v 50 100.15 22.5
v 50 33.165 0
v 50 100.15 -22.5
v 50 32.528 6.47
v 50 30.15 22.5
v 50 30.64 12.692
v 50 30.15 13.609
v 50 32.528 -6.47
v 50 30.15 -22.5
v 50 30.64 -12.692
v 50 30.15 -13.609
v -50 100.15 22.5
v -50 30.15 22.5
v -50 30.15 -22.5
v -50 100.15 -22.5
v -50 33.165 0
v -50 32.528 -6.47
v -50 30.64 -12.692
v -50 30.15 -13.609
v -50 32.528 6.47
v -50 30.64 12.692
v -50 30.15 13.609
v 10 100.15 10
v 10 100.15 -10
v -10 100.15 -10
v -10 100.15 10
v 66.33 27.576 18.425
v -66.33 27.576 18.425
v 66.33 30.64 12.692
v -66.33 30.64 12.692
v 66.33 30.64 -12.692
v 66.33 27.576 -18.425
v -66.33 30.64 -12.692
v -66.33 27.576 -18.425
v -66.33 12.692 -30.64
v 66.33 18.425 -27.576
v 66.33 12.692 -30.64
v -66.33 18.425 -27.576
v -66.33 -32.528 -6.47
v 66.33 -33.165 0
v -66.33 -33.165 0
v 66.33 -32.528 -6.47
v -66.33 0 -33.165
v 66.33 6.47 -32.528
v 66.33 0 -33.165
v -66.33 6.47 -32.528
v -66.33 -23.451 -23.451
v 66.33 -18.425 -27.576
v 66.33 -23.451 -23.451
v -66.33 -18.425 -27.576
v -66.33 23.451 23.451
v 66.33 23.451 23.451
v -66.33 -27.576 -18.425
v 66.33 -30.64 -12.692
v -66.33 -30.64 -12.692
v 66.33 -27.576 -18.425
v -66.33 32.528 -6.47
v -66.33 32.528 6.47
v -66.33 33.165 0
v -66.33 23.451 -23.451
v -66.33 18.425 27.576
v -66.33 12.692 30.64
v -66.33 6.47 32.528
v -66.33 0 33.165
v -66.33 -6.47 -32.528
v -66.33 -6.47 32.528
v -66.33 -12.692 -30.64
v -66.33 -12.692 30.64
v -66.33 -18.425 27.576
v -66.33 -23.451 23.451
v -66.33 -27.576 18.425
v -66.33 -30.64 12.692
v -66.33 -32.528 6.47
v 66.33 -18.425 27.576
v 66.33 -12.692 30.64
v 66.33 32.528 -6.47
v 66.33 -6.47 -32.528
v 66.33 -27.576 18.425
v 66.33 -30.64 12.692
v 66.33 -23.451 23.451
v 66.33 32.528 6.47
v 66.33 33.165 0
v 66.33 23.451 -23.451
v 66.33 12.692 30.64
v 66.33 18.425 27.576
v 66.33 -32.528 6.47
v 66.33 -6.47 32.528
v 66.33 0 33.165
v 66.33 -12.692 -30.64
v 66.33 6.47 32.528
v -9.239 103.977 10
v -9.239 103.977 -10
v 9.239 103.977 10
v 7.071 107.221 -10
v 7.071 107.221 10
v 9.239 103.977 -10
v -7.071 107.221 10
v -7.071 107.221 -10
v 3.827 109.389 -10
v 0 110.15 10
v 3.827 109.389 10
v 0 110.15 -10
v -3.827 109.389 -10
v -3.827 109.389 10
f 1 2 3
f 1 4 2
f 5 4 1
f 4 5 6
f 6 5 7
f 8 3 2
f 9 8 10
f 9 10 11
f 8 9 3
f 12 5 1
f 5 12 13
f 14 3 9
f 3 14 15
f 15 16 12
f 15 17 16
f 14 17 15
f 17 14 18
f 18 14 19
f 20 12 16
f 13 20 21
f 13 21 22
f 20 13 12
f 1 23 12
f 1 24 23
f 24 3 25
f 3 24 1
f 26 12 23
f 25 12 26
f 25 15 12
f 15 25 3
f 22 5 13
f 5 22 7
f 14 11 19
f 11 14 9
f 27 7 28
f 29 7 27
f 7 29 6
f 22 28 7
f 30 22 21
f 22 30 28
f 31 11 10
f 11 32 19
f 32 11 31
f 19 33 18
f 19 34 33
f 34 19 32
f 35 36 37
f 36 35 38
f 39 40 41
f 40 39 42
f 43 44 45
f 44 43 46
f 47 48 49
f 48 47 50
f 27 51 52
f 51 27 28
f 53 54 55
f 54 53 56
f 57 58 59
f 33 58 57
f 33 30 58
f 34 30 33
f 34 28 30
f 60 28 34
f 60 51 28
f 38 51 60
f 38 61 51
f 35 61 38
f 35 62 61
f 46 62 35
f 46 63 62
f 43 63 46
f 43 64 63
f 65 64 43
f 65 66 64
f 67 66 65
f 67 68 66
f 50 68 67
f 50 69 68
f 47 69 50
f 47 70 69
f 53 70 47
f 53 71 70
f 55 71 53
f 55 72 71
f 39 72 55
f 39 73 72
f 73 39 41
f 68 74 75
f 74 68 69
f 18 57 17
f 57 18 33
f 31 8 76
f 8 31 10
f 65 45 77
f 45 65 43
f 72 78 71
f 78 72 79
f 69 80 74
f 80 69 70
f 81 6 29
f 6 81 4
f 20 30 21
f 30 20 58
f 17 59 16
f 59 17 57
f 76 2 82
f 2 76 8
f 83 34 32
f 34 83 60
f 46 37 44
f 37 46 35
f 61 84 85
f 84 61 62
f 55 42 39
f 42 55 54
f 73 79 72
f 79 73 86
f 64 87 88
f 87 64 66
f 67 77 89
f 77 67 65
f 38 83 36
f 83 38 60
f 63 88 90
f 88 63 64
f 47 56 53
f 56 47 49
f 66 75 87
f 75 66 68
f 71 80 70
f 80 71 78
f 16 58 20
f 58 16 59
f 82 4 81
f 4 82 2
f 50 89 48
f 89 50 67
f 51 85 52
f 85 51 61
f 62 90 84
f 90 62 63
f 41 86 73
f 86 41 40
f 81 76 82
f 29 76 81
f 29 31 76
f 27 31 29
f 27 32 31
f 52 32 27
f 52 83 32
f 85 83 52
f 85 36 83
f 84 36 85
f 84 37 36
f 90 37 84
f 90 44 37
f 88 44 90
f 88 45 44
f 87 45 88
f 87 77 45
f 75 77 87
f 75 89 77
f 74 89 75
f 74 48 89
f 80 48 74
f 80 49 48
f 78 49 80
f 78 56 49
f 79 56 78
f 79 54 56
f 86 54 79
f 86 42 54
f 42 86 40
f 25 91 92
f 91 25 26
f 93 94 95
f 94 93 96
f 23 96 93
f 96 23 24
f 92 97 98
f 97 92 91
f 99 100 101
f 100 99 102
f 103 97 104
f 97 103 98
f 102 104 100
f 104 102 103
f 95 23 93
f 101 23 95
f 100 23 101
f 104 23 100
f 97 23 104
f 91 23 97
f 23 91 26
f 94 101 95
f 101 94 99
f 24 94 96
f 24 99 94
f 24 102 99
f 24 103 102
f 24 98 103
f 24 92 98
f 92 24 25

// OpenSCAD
// Auto-generated by scripts/author_from_manifest.py (Phase D.3).
// Source: data/phase_d_manifest.json (sku_intent='agf-5000-main-drain').
// Do not hand-edit — regenerate from the manifest.
//
// @part agf_5000_main_drain
// @kind device
// @category trim.main.drain
// @display-name "AGF 5000 Series Main Drain 2\""
// @mfg agf_manufacturing
// @mfg-pn 5000
// @listing UL
// @price-usd 185.00
// @install-minutes 30
// @crew journeyman
// @param size_in number default=2 label="Size" unit="in"
// @port inlet position=[0,0,0] direction=[0,0,-1] style=grooved size_in=2 role=run_a

size_in = 2.0;

function od_mm(nps) =
    nps ==   1  ? 33.4 :
    nps == 1.25 ? 42.2 :
    nps == 1.5  ? 48.3 :
    nps ==   2  ? 60.3 : 33.4;

od = od_mm(size_in);
box_w = 100;
box_h = 70;
box_d = 45;

union() {
    // Enclosure
    translate([0, box_h/2 + od/2, 0])
        cube([box_w, box_h, box_d], center = true);
    // Pipe saddle stub
    rotate([0, 90, 0])
        cylinder(h = od * 2.2, d = od * 1.1, center = true, $fn = 32);
    // Conduit nipple
    translate([0, box_h + od/2, 0])
        cylinder(h = 20, d = 20, center = true, $fn = 16);
}
